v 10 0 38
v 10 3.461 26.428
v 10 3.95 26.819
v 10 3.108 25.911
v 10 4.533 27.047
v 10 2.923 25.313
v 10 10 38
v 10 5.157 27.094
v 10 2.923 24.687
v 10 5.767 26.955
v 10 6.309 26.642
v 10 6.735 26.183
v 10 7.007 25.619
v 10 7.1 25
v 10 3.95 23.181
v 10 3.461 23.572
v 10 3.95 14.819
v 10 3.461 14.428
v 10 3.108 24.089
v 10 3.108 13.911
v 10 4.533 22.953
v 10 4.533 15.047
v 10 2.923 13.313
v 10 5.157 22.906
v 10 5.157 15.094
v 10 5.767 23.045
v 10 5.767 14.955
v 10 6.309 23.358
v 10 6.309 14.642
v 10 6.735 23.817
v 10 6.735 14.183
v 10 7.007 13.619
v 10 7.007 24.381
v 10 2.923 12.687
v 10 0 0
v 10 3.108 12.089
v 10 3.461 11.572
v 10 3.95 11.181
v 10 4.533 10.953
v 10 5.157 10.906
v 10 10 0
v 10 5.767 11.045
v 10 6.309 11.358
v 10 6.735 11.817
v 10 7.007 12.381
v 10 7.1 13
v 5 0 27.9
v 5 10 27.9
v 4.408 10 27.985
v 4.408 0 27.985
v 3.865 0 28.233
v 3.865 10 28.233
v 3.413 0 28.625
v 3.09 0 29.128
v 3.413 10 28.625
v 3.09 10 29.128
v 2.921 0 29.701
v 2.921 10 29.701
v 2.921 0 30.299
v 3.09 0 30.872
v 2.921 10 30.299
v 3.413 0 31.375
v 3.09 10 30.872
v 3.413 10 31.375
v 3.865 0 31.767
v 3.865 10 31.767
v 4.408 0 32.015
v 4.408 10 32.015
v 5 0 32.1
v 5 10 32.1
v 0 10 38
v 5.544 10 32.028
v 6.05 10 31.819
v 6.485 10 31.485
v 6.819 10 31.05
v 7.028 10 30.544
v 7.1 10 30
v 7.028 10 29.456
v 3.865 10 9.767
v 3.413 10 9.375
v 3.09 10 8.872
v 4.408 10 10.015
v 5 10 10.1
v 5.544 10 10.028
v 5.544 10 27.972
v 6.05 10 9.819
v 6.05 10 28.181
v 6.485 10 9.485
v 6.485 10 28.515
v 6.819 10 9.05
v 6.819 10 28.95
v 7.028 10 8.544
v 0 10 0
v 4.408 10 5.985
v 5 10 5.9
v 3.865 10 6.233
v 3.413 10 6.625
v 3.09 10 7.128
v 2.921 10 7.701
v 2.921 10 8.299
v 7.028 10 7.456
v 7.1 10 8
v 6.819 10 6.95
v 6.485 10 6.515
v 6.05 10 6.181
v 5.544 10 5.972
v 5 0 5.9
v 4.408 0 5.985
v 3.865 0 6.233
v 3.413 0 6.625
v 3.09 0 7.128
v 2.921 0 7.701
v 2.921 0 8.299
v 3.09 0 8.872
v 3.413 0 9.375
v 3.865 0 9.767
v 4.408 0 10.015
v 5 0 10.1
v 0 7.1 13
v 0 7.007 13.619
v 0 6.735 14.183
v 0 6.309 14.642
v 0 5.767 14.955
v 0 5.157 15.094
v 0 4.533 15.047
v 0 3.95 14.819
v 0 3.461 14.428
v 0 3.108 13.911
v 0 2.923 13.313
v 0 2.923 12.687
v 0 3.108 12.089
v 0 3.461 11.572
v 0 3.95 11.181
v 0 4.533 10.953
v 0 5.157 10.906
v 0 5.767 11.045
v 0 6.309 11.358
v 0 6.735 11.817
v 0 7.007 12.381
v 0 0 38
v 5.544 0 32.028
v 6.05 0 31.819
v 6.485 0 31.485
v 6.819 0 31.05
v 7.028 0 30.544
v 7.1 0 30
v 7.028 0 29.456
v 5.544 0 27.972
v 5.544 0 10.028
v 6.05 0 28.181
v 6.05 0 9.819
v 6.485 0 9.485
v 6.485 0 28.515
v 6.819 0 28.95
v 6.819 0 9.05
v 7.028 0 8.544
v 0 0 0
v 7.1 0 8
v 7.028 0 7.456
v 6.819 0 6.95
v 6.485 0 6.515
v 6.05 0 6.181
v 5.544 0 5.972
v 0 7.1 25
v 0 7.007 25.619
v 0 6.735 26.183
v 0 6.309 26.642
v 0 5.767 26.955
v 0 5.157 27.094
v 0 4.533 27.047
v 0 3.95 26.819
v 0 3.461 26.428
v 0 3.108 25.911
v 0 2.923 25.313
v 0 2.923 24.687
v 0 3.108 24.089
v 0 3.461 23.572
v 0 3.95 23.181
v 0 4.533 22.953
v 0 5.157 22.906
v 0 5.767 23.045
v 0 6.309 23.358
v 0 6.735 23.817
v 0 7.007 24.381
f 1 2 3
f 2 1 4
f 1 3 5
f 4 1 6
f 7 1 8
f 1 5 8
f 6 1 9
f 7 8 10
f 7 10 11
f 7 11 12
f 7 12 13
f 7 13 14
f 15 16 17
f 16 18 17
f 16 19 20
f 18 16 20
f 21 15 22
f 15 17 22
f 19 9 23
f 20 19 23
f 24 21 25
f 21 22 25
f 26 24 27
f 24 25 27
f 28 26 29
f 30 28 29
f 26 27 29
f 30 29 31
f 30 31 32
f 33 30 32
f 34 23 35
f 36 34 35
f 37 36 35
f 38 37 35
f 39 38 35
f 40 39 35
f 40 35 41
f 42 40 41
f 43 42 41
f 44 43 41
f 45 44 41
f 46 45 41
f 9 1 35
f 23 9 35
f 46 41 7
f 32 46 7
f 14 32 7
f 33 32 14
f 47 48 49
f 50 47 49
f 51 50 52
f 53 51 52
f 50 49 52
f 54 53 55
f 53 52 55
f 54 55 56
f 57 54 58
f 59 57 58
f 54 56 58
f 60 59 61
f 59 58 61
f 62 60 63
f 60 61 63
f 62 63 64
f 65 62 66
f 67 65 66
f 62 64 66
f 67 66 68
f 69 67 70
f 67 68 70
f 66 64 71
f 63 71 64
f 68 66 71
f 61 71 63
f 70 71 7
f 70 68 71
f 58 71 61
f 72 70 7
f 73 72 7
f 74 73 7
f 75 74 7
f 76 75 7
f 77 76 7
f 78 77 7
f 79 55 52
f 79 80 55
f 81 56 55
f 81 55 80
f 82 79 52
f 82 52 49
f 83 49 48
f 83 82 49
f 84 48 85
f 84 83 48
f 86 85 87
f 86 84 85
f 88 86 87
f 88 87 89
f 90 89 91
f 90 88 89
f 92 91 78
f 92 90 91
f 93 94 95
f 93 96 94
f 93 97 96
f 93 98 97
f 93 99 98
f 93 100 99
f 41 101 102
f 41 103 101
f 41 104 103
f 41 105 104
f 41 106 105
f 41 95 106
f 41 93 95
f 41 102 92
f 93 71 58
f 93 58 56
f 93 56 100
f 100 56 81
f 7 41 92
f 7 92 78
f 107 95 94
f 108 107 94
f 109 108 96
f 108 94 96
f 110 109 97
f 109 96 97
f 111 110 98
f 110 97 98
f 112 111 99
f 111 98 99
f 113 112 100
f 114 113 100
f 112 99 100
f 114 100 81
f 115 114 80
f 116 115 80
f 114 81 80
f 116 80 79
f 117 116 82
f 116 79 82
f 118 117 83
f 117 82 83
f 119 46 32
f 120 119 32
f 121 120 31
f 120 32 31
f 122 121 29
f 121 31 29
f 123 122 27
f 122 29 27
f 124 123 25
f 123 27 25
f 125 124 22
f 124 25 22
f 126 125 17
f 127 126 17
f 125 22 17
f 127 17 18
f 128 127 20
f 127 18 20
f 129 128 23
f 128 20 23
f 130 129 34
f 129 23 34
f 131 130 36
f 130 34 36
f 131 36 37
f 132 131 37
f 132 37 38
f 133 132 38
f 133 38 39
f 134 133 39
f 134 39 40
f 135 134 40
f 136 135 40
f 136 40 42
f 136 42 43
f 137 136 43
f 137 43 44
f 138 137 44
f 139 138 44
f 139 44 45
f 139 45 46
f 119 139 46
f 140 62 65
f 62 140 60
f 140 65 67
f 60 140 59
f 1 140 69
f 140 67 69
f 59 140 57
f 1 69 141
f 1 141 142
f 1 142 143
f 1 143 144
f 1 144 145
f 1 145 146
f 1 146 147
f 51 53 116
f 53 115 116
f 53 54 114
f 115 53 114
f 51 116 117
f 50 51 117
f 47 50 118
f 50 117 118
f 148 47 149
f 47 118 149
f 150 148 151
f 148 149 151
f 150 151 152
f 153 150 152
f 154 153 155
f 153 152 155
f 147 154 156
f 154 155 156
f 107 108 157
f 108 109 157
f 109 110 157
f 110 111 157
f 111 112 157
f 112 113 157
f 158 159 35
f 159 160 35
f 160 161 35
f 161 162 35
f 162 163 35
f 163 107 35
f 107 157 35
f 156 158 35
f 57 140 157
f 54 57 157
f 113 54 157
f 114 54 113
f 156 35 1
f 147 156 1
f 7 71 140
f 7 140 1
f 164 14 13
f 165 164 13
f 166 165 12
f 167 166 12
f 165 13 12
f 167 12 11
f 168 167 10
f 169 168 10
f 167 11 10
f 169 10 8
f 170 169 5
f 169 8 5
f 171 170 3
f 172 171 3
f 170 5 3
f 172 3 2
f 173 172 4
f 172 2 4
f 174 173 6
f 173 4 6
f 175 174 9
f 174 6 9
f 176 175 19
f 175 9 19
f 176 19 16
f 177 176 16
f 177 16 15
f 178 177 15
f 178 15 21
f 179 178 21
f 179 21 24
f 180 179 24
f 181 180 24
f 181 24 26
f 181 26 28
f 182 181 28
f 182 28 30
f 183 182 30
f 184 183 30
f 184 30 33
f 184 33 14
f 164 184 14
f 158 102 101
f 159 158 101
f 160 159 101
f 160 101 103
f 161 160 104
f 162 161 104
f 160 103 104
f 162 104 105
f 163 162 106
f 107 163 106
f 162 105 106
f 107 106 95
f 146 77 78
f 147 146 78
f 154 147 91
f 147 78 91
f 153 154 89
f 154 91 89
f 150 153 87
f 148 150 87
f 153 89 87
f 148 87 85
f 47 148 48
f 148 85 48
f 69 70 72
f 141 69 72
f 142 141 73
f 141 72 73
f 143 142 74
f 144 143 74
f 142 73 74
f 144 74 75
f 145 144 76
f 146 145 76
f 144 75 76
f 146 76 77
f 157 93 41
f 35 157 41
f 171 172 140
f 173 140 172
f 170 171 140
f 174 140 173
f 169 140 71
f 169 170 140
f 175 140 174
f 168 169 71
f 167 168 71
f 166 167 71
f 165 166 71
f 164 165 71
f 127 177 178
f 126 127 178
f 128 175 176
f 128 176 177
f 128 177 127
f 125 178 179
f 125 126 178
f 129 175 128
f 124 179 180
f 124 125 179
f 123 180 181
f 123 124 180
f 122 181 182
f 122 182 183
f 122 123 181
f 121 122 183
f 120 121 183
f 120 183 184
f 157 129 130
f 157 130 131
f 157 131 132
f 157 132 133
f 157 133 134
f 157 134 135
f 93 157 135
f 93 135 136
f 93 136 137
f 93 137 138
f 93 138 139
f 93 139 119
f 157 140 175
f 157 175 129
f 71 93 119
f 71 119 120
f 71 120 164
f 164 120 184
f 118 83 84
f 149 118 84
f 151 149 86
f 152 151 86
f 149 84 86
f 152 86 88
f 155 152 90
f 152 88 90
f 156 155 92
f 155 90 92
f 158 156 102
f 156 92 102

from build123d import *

# Parameters (mm, degrees)
SKETCH_1_W          = 10
SKETCH_1_H          = 10
EXTRUDE_1_DEPTH     = 38
CUT_EXTRUDE_1_DEPTH = 22
SKETCH_4_R          = 2.1
CUT_EXTRUDE_2_DEPTH = 22


with BuildPart() as part:
    # 草图1 → 凸台-拉伸1 (new body)
    with BuildSketch(Plane.XY):
        with Locations((5, 5)):
            Rectangle(SKETCH_1_W, SKETCH_1_H)
    extrude(amount=EXTRUDE_1_DEPTH)

    # 草图3 → 切除-拉伸1 (cut)
    with BuildSketch(Plane(origin=(0, 10, 0), x_dir=(1, 0, 0), z_dir=(0, 1, 0))):
        with BuildLine():
            ThreePointArc((7.1, -8), (6.48492424, -6.51507576), (5, -5.9))
            Line((5, -5.9), (5, -10.1))
            ThreePointArc((5, -10.1), (6.48492424, -9.48492424), (7.1, -8))
        make_face()
        with BuildLine():
            Line((5, -10.1), (5, -5.9))
            ThreePointArc((5, -5.9), (2.9, -8), (5, -10.1))
        make_face()
        with BuildLine():
            ThreePointArc((7.1, -30), (6.48492424, -28.51507576), (5, -27.9))
            Line((5, -27.9), (5, -32.1))
            ThreePointArc((5, -32.1), (6.48492424, -31.48492424), (7.1, -30))
        make_face()
        with BuildLine():
            Line((5, -32.1), (5, -27.9))
            ThreePointArc((5, -27.9), (2.9, -30), (5, -32.1))
        make_face()
    extrude(amount=-CUT_EXTRUDE_1_DEPTH, mode=Mode.SUBTRACT)

    # 草图4 → 切除-拉伸2 (cut)
    with BuildSketch(Plane(origin=(10, 0, 0), x_dir=(0, 0, -1), z_dir=(1, 0, 0))):
        with Locations(Location((-25, 5, 0), (0, 0, 90))):
            Circle(SKETCH_4_R)
        with Locations(Location((-13, 5, 0), (0, 0, 90))):
            Circle(SKETCH_4_R)
    extrude(amount=-CUT_EXTRUDE_2_DEPTH, mode=Mode.SUBTRACT)


solid = part.part
